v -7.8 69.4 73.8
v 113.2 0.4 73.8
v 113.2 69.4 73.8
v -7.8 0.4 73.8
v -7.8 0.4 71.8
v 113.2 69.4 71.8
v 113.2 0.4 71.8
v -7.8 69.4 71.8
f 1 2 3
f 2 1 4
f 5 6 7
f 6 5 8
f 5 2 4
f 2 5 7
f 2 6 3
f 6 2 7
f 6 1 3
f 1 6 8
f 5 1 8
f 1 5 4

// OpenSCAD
mink_r = 2;
long_in = 120-mink_r*2;
width_in = 75-mink_r*2;
height_in = 60;
thick = 2.8;
gap = 5.0;
let_width = 17;

r1 = 7.6/2;
r0 = r1 - 0.8;
r2 = r1 + 4;
r3 = r2 + 4;
rh = 20;

top_thick = 2.8;
pout_r0 = r0+3;
pout_r1 = pout_r0+1.2;
pipe_out_l = 15;
pipe_out_h = 38;

pipe_top_h = 10+pout_r0;




module mink_cube(x,y,z,r){
    minkowski()
    {
        cube(size=[x, y, z/2]);
        cylinder(r=r, h=z/2, $fn=200);
    }
}
module box_body_t(){
    cube(size=[15, 15, height_in*7/8]);
    difference(){
        mink_cube(long_in, width_in, height_in+let_width, mink_r);
        translate([thick, thick, thick]) {
            cube([long_in-thick*2, width_in-thick*2, height_in+let_width]);
        }
        pipe_out_su(pout_r0, pout_r1, pipe_out_l);
        pipe_out2_su(pout_r0, pout_r1, pipe_out_l, long_in/2);
        pipe_out2_su(pout_r0, pout_r1, pipe_out_l, long_in*2/3);
    }
}

module box_body()
{
    difference(){
        box_body_t();
        translate([-mink_r-1, -mink_r-1, 0]) {
            cube(size=[15-thick+mink_r-1, 15-thick+mink_r-1, height_in*7/8-thick]);
        }
    }
    offset = thick+2+gap;

    difference(){
        translate([-offset, 20, 0]){
            mink_cube(offset, (offset+width_in)*4/7, (height_in+let_width)/2, mink_r);
        }
        translate([-gap-mink_r, 5, -1]){
            cube(size=[gap, (width_in), let_width]);
        }
    }

    difference(){
        translate([20, -offset, 0]){
            mink_cube((offset+long_in)*5/7, (offset), (height_in+let_width)/2, mink_r);
        }

        translate([5, -gap-mink_r, -1]){
            cube(size=[long_in, gap, let_width]);
        }
    }
    translate([long_in/3, 0, 15]) {
        cube(size=[2.0, width_in, height_in-20]);
    }

}

module pipe_su(){
    cylinder(r=r0, h=height_in+let_width-pipe_top_h+r0, $fn=200);

    difference(){
        cylinder(r=r2, h=rh, $fn=200);
        cylinder(r=r1, h=rh, $fn=200);
    }
    translate([0, 0, height_in+let_width-pipe_top_h]) {
         rotate([-90, 0, 0]) {
             translate([0, 0, -r0]) {
                cylinder(r=r0, h=width_in-r3-thick*4, $fn=200);
             }
         }
         
    }
}
module pipe_body(){
    cylinder(r=r3, h=rh+thick, $fn=200);
    cylinder(r=r1, h=height_in+let_width-pipe_top_h, $fn=200);
    translate([0, 0, height_in+let_width-pipe_top_h]) {
         cube(size=[r2+0.4, r2+0.4, r2+0.4], center=true);
         rotate([-90, 0, 0]) {
             translate([0, 0, r2/2]) {
                difference(){
                    cylinder(r=r1, h=width_in-r3-thick*4-r0*2, $fn=200);
                    rotate([0, 0, 50]) {
                        translate([r0/2, -3, (r2+r0/2)]) {
                            cube(size=[r0, r0*2, r0*2+20]);
                        }

                    }                    
                }
             }
         }
         
    }
    
}

module pipe(){
    difference(){
        pipe_body();
        pipe_su();
    }
    difference(){
        for (i=[0:2]) {
            translate([0, 0, i*6]) {
                cylinder($fn=200, $fa = 12, $fs = 2, h = 6, r1 = r1, r2 = 8.6/2);
            }
        }
        translate([0, 0, -2]) {
            cylinder(r=r1, h=height_in+let_width, $fn=200); 
        }
    }
}

module box_top(accuracy){
    translate([-mink_r-thick-3, -mink_r+2.4, height_in+let_width-top_thick-2.4]) {
        cube(size=[long_in+thick+3-accuracy, width_in+thick-2.4*2, top_thick-accuracy]);
    }

    // translate([-mink_r-thick+30, -mink_r+2.4, height_in+let_width-top_thick-3]) {
    //     #cube(size=[long_in+thick+3, width_in+thick-2.4*2, top_thick]);
    // }
}
module pipe_out_su(r0, r1,l){
    translate([long_in-r1-thick*2, width_in-thick*2, pipe_out_h+r1]) {
        rotate([-90, 0, 0]) {
            cylinder(r=r0, h=l+thick*3,$fn=200);
        }
    }
}
module pipe_out(r0, r1, l){
    difference(){
        translate([long_in-r1-thick*2, width_in, pipe_out_h+r1]) {
            rotate([-90, 0, 0]) {
                cylinder(r=r1, h=l,$fn=200);
            }
        }
        pipe_out_su(r0, r1, l);
    }
}

module pipe_out2_su(r0, r1, l, offset){
    // difference(){
        // translate([long_in-thick*2, width_in-r1-thick*2, height_in+let_width-pipe_top_h+2]) {
        //     rotate([ 0, 90, 0]) {
        translate([offset, width_in-thick*2, height_in+let_width-pipe_top_h]) {
            rotate([-90, 0, 0]) {
                cylinder(r=r0, h=l+thick*3,$fn=200);
            }
        }
    // }
}

module pipe_out2(r0, r1, l, offset){
    difference(){
        // translate([long_in, width_in-r1-thick*2, height_in+let_width-pipe_top_h+2]) {
        //     rotate([ 0, 90, 0]) {
        translate([offset, width_in, height_in+let_width-pipe_top_h]) {
            rotate([-90, 0, 0]) {
                cylinder(r=r1, h=l,$fn=200);
            }
        }
        pipe_out2_su(r0, r1, l, offset);
    }
}

// difference(){
//     box_body();
//     translate([long_in/3-r3, r3+thick*4, 0]) {
//         pipe_body();
//     }
//     box_top(0);
// }
// translate([long_in/3-r3, r3+thick*4, 0]) {
//     pipe();
// }
// pipe_out(pout_r0, pout_r1, pipe_out_l);
// pipe_out2(pout_r0, pout_r1, 7, long_in/2);
// pipe_out2(pout_r0, pout_r1, 7, long_in*2/3);


box_top(0.8);
